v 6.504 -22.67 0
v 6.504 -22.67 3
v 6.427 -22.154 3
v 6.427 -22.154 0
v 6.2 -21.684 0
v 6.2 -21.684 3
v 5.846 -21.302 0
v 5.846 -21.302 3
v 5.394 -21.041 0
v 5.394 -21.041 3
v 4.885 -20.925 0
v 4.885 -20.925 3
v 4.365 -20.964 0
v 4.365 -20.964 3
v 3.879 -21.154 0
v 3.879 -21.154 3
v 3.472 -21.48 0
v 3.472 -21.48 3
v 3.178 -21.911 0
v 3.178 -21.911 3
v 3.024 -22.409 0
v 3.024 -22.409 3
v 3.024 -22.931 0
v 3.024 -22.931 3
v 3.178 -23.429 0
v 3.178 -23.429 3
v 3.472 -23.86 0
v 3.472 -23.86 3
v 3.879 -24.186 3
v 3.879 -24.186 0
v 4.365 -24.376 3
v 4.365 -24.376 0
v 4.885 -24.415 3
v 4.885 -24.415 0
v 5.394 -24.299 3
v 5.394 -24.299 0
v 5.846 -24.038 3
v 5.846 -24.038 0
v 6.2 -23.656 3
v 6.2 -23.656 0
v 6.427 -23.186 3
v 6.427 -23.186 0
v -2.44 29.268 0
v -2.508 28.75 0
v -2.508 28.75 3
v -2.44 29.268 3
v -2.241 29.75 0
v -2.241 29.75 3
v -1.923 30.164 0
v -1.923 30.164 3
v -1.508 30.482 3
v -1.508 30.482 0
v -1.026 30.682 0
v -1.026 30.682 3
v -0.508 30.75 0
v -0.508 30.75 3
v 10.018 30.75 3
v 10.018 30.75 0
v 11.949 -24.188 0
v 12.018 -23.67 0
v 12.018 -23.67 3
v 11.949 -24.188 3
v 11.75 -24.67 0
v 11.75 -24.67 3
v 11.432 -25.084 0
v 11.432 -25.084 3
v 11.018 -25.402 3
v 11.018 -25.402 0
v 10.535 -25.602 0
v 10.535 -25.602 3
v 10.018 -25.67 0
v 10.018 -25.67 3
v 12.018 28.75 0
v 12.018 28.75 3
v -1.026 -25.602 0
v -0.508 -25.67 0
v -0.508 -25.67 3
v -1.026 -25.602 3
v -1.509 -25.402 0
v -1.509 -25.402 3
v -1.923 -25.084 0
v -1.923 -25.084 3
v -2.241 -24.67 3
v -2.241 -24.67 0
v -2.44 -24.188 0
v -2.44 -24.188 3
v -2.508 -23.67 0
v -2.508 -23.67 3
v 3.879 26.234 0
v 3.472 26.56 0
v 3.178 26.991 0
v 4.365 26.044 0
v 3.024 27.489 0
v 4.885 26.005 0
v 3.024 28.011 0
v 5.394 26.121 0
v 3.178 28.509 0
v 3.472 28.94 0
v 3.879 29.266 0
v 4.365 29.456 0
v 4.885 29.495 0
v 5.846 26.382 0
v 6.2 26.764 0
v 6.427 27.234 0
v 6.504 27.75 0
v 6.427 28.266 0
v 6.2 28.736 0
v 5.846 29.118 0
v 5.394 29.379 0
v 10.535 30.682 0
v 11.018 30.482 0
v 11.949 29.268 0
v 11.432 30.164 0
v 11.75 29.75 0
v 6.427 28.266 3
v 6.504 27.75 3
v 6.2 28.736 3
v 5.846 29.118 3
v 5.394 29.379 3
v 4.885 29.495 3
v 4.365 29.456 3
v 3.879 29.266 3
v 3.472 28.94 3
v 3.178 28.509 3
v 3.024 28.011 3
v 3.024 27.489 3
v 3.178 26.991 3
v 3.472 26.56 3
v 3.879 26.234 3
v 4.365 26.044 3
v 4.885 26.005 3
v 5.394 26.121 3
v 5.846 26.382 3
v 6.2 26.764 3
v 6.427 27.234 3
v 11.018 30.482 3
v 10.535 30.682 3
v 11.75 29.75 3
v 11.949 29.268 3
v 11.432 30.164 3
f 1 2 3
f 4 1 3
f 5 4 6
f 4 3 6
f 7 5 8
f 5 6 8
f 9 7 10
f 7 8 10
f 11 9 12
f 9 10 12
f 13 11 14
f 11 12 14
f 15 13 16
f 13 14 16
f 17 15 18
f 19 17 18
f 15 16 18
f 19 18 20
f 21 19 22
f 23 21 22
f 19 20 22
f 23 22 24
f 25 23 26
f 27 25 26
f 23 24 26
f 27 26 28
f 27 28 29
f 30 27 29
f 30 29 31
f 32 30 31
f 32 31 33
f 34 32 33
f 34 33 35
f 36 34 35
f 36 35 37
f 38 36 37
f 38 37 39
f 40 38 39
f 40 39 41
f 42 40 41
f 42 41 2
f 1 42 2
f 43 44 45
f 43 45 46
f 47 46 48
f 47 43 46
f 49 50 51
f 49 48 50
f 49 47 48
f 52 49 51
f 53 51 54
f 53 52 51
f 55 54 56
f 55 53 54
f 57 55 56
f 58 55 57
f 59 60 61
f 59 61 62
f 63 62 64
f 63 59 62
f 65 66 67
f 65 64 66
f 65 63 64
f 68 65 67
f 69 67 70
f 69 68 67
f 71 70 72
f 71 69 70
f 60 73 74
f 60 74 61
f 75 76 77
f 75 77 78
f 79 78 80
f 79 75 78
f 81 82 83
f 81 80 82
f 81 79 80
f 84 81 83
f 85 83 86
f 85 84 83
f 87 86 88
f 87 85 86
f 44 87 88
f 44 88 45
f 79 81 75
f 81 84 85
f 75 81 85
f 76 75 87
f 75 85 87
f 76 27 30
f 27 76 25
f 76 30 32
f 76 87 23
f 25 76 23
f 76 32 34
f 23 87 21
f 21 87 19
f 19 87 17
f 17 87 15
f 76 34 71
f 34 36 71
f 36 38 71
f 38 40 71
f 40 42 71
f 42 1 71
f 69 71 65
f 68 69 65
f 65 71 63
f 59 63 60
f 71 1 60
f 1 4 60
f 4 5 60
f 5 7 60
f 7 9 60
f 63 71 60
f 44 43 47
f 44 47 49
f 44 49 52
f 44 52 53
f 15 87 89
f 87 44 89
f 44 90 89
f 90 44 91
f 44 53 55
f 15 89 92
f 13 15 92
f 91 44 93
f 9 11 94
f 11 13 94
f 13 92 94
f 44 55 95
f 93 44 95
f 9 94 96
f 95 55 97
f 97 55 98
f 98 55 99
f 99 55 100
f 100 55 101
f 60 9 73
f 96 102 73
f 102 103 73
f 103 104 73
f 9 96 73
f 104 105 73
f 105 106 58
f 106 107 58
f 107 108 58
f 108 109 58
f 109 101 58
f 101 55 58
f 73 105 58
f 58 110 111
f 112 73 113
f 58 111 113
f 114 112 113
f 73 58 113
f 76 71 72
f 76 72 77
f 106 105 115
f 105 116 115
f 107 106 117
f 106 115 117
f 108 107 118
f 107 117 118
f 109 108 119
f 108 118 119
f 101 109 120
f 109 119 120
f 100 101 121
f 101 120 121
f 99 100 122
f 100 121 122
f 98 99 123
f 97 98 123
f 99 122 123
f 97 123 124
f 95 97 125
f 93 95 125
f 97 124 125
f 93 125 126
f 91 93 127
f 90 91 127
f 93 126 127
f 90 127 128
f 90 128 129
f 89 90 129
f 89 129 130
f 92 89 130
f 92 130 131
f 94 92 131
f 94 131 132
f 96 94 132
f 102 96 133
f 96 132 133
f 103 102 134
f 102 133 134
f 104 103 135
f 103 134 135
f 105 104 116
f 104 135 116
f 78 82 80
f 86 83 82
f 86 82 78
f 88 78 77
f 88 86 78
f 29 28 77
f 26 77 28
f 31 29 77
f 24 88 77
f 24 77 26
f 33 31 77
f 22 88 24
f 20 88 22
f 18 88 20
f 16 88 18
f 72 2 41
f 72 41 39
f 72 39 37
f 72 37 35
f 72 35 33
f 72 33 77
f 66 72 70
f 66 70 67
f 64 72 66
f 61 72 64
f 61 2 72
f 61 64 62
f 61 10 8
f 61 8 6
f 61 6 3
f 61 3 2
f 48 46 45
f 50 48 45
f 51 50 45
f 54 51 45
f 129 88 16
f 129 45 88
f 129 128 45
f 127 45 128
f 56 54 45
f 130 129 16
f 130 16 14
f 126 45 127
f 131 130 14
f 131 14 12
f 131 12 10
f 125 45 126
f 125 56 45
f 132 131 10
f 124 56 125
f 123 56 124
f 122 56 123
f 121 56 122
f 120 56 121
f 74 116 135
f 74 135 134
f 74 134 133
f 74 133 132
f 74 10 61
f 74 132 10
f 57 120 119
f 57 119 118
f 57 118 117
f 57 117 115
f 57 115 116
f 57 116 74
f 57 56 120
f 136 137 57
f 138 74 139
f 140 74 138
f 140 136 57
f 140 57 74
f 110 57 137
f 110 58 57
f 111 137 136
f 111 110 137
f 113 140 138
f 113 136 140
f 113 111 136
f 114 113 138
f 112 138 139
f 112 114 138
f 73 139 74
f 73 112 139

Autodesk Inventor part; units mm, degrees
ref_plane "YZ Plane" through (0, 0, 0) normal (1, 0, 0) x (0, 1, 0)
ref_plane "XZ Plane" through (0, 0, 0) normal (0, 1, 0) x (-1, 0, 0)
ref_plane "XY Plane" through (0, 0, 0) normal (0, 0, 1) x (1, 0, 0)
sketch "Sketch1" plane through (0, 0, 0) normal (0, 0, 1) x (1, 0, 0)
  line L0 (9.9495, -14.97) -> (12.0175, -14.97) projected
  line L1 (9.9495, -20.042) -> (9.9495, -14.97) projected
  line L2 (4.9095, -20.042) -> (9.9495, -20.042) projected
  line L3 (4.9095, -15.47) -> (4.9095, -20.042) projected
  line L4 (-10.8425, -15.47) -> (4.9095, -15.47) projected
  line L5 (-10.8425, 10.39) -> (-10.8425, -15.47) projected
  line L6 (-7.5245, 10.39) -> (-10.8425, 10.39) projected
  line L7 (-7.5245, 30.75) -> (-7.5245, 10.39) projected
  line L8 (-12.0175, 30.75) -> (-7.5245, 30.75) projected
  line L9 (-12.0175, -25.67) -> (-12.0175, 30.75) projected
  line L10 (30.7975, -25.67) -> (-12.0175, -25.67) projected
  spline S0 degree 3 poles (31.7975, -27.4021) (31.7975, -27.1472) (31.7079, -26.8547) (31.4014, -26.2852) (31.0746, -25.9471) (30.7975, -25.67) knots 0.505532 0.505532 0.505532 0.505532 0.581995 0.581995 0.699558 0.699558 0.699558 0.699558 projected
  line L11 (31.7975, -32.02) -> (31.7975, -27.4021) projected
  line L12 (33.7975, -32.02) -> (31.7975, -32.02) projected
  line L13 (33.7975, -32.02) -> (33.7975, -17.51) projected
  line L14 (12.0175, -17.51) -> (33.7975, -17.51) projected
  line L15 (12.0175, -14.97) -> (12.0175, -17.51) projected
  line L16 (4.9095, 10.39) -> (-2.5085, 10.39) projected
  line L17 (4.9095, 14.962) -> (4.9095, 10.39) projected
  line L18 (9.9495, 14.962) -> (4.9095, 14.962) projected
  line L19 (9.9495, 9.89) -> (9.9495, 14.962) projected
  line L20 (12.0175, 9.89) -> (9.9495, 9.89) projected
  line L21 (12.0175, 22.59) -> (12.0175, 9.89) projected
  line L22 (33.7975, 22.59) -> (12.0175, 22.59) projected
  line L23 (33.7975, 22.59) -> (33.7975, 37.1) projected
  line L24 (31.7975, 37.1) -> (33.7975, 37.1) projected
  line L25 (31.7975, 32.4821) -> (31.7975, 37.1) projected
  spline S1 degree 3 poles (30.7975, 30.75) (31.0746, 31.0271) (31.4014, 31.3652) (31.7079, 31.9347) (31.7975, 32.2272) (31.7975, 32.4821) knots 0 0 0 0 0.117563 0.117563 0.194026 0.194026 0.194026 0.194026 projected
  line L26 (-2.5085, 30.75) -> (30.7975, 30.75) projected
  line L27 (-2.5085, 10.39) -> (-2.5085, 30.75) projected
  line L28 (10.0175, -25.67) -> (-0.5085, -25.67)
  line L29 (-2.5085, -23.67) -> (-2.5085, 28.75)
  line L30 (-0.5085, 30.75) -> (10.0175, 30.75)
  line L31 (12.0175, 28.75) -> (12.0175, -23.67)
  arc A0 (-2.5085, -23.67) -> (-0.5085, -25.67) centre (-0.5085, -23.67) ccw
  arc A1 (10.0175, -25.67) -> (12.0175, -23.67) centre (10.0175, -23.67) ccw
  arc A2 (-0.5085, 30.75) -> (-2.5085, 28.75) centre (-0.5085, 28.75) ccw
  arc A3 (12.0175, 28.75) -> (10.0175, 30.75) centre (10.0175, 28.75) ccw
  circle A4 centre (4.7545, -22.67) radius 1.625 projected
  circle A5 centre (4.7545, 27.75) radius 1.625 projected
  point P0 (0, 0)
  point P1 (12.0175, -25.67)
  dimension "d0" = 2
extrude "Extrusion1" add sketch "Sketch1" along normal blind 3 contours L1 L2 L3 L4 L29 L16 L17 L18 L19 L20 L31 L0 | L0 L15 L31 A1 L10 A0 L29 L4 L3 L2 L1 | L20 L19 L18 L17 L16 L27 A2 L26 A3 L31 L21 | A4 | A5
sketch "Sketch2" plane through (0, 0, 3) normal (0, 0, 1) x (1, 0, 0)
  line L0 (9.9495, -14.97) -> (12.0175, -14.97) projected
  line L1 (9.9495, -20.042) -> (9.9495, -14.97) projected
  line L2 (4.9095, -20.042) -> (9.9495, -20.042) projected
  line L3 (4.9095, -15.47) -> (4.9095, -20.042) projected
  line L4 (-10.8425, -15.47) -> (4.9095, -15.47) projected
  line L5 (-10.8425, 10.39) -> (-10.8425, -15.47) projected
  line L6 (-7.5245, 10.39) -> (-10.8425, 10.39) projected
  line L7 (-7.5245, 30.75) -> (-7.5245, 10.39) projected
  line L8 (-12.0175, 30.75) -> (-7.5245, 30.75) projected
  line L9 (-12.0175, -25.67) -> (-12.0175, 30.75) projected
  line L10 (30.7975, -25.67) -> (-12.0175, -25.67) projected
  spline S0 degree 3 poles (31.7975, -27.4021) (31.7975, -27.1472) (31.7079, -26.8547) (31.4014, -26.2852) (31.0746, -25.9471) (30.7975, -25.67) knots 0.505532 0.505532 0.505532 0.505532 0.581995 0.581995 0.699558 0.699558 0.699558 0.699558 projected
  line L11 (31.7975, -32.02) -> (31.7975, -27.4021) projected
  line L12 (33.7975, -32.02) -> (31.7975, -32.02) projected
  line L13 (33.7975, -32.02) -> (33.7975, -17.51) projected
  line L14 (12.0175, -17.51) -> (33.7975, -17.51) projected
  line L15 (12.0175, -14.97) -> (12.0175, -17.51) projected
  line L16 (4.9095, 10.39) -> (-2.5085, 10.39) projected
  line L17 (4.9095, 14.962) -> (4.9095, 10.39) projected
  line L18 (9.9495, 14.962) -> (4.9095, 14.962) projected
  line L19 (9.9495, 9.89) -> (9.9495, 14.962) projected
  line L20 (12.0175, 9.89) -> (9.9495, 9.89) projected
  line L21 (12.0175, 22.59) -> (12.0175, 9.89) projected
  line L22 (33.7975, 22.59) -> (12.0175, 22.59) projected
  line L23 (33.7975, 22.59) -> (33.7975, 37.1) projected
  line L24 (31.7975, 37.1) -> (33.7975, 37.1) projected
  line L25 (31.7975, 32.4821) -> (31.7975, 37.1) projected
  spline S1 degree 3 poles (30.7975, 30.75) (31.0746, 31.0271) (31.4014, 31.3652) (31.7079, 31.9347) (31.7975, 32.2272) (31.7975, 32.4821) knots 0 0 0 0 0.117563 0.117563 0.194026 0.194026 0.194026 0.194026 projected
  line L26 (-2.5085, 30.75) -> (30.7975, 30.75) projected
  line L27 (-2.5085, 10.39) -> (-2.5085, 30.75) projected
  line L28 (-2.5085, 28.75) -> (-2.5085, -23.67) projected
  arc A0 (-2.5085, -23.67) -> (-0.5085, -25.67) centre (-0.5085, -23.67) ccw projected
  line L29 (-0.5085, -25.67) -> (10.0175, -25.67) projected
  arc A1 (10.0175, -25.67) -> (12.0175, -23.67) centre (10.0175, -23.67) ccw projected
  line L30 (12.0175, -23.67) -> (12.0175, 28.75) projected
  arc A2 (12.0175, 28.75) -> (10.0175, 30.75) centre (10.0175, 28.75) ccw projected
  line L31 (10.0175, 30.75) -> (-0.5085, 30.75) projected
  arc A3 (-0.5085, 30.75) -> (-2.5085, 28.75) centre (-0.5085, 28.75) ccw projected
  line L32 (-0.5085, -25.67) -> (10.0175, -25.67) projected
  line L33 (4.7545, -25.67) -> (4.7545, -22.67)
  circle A4 centre (4.7545, -22.67) radius 1.75
  line L34 (0, 0) -> (-38.7909, 0)
  line L35 (4.7545, 30.75) -> (4.7545, 27.75)
  circle A5 centre (4.7545, 27.75) radius 1.75
  circle A6 centre (4.7545, -22.67) radius 1.625 projected
  circle A7 centre (4.7545, 27.75) radius 1.625 projected
  dimension "d3" = 3
  dimension "d4" = 3.5
  dimension "d5" = 3
  dimension "d6" = 3.5
extrude "Extrusion2" cut sketch "Sketch2" against normal blind 3 contours A6 | A4 | A7 | A5
properties part number "SteerServoClamp"
